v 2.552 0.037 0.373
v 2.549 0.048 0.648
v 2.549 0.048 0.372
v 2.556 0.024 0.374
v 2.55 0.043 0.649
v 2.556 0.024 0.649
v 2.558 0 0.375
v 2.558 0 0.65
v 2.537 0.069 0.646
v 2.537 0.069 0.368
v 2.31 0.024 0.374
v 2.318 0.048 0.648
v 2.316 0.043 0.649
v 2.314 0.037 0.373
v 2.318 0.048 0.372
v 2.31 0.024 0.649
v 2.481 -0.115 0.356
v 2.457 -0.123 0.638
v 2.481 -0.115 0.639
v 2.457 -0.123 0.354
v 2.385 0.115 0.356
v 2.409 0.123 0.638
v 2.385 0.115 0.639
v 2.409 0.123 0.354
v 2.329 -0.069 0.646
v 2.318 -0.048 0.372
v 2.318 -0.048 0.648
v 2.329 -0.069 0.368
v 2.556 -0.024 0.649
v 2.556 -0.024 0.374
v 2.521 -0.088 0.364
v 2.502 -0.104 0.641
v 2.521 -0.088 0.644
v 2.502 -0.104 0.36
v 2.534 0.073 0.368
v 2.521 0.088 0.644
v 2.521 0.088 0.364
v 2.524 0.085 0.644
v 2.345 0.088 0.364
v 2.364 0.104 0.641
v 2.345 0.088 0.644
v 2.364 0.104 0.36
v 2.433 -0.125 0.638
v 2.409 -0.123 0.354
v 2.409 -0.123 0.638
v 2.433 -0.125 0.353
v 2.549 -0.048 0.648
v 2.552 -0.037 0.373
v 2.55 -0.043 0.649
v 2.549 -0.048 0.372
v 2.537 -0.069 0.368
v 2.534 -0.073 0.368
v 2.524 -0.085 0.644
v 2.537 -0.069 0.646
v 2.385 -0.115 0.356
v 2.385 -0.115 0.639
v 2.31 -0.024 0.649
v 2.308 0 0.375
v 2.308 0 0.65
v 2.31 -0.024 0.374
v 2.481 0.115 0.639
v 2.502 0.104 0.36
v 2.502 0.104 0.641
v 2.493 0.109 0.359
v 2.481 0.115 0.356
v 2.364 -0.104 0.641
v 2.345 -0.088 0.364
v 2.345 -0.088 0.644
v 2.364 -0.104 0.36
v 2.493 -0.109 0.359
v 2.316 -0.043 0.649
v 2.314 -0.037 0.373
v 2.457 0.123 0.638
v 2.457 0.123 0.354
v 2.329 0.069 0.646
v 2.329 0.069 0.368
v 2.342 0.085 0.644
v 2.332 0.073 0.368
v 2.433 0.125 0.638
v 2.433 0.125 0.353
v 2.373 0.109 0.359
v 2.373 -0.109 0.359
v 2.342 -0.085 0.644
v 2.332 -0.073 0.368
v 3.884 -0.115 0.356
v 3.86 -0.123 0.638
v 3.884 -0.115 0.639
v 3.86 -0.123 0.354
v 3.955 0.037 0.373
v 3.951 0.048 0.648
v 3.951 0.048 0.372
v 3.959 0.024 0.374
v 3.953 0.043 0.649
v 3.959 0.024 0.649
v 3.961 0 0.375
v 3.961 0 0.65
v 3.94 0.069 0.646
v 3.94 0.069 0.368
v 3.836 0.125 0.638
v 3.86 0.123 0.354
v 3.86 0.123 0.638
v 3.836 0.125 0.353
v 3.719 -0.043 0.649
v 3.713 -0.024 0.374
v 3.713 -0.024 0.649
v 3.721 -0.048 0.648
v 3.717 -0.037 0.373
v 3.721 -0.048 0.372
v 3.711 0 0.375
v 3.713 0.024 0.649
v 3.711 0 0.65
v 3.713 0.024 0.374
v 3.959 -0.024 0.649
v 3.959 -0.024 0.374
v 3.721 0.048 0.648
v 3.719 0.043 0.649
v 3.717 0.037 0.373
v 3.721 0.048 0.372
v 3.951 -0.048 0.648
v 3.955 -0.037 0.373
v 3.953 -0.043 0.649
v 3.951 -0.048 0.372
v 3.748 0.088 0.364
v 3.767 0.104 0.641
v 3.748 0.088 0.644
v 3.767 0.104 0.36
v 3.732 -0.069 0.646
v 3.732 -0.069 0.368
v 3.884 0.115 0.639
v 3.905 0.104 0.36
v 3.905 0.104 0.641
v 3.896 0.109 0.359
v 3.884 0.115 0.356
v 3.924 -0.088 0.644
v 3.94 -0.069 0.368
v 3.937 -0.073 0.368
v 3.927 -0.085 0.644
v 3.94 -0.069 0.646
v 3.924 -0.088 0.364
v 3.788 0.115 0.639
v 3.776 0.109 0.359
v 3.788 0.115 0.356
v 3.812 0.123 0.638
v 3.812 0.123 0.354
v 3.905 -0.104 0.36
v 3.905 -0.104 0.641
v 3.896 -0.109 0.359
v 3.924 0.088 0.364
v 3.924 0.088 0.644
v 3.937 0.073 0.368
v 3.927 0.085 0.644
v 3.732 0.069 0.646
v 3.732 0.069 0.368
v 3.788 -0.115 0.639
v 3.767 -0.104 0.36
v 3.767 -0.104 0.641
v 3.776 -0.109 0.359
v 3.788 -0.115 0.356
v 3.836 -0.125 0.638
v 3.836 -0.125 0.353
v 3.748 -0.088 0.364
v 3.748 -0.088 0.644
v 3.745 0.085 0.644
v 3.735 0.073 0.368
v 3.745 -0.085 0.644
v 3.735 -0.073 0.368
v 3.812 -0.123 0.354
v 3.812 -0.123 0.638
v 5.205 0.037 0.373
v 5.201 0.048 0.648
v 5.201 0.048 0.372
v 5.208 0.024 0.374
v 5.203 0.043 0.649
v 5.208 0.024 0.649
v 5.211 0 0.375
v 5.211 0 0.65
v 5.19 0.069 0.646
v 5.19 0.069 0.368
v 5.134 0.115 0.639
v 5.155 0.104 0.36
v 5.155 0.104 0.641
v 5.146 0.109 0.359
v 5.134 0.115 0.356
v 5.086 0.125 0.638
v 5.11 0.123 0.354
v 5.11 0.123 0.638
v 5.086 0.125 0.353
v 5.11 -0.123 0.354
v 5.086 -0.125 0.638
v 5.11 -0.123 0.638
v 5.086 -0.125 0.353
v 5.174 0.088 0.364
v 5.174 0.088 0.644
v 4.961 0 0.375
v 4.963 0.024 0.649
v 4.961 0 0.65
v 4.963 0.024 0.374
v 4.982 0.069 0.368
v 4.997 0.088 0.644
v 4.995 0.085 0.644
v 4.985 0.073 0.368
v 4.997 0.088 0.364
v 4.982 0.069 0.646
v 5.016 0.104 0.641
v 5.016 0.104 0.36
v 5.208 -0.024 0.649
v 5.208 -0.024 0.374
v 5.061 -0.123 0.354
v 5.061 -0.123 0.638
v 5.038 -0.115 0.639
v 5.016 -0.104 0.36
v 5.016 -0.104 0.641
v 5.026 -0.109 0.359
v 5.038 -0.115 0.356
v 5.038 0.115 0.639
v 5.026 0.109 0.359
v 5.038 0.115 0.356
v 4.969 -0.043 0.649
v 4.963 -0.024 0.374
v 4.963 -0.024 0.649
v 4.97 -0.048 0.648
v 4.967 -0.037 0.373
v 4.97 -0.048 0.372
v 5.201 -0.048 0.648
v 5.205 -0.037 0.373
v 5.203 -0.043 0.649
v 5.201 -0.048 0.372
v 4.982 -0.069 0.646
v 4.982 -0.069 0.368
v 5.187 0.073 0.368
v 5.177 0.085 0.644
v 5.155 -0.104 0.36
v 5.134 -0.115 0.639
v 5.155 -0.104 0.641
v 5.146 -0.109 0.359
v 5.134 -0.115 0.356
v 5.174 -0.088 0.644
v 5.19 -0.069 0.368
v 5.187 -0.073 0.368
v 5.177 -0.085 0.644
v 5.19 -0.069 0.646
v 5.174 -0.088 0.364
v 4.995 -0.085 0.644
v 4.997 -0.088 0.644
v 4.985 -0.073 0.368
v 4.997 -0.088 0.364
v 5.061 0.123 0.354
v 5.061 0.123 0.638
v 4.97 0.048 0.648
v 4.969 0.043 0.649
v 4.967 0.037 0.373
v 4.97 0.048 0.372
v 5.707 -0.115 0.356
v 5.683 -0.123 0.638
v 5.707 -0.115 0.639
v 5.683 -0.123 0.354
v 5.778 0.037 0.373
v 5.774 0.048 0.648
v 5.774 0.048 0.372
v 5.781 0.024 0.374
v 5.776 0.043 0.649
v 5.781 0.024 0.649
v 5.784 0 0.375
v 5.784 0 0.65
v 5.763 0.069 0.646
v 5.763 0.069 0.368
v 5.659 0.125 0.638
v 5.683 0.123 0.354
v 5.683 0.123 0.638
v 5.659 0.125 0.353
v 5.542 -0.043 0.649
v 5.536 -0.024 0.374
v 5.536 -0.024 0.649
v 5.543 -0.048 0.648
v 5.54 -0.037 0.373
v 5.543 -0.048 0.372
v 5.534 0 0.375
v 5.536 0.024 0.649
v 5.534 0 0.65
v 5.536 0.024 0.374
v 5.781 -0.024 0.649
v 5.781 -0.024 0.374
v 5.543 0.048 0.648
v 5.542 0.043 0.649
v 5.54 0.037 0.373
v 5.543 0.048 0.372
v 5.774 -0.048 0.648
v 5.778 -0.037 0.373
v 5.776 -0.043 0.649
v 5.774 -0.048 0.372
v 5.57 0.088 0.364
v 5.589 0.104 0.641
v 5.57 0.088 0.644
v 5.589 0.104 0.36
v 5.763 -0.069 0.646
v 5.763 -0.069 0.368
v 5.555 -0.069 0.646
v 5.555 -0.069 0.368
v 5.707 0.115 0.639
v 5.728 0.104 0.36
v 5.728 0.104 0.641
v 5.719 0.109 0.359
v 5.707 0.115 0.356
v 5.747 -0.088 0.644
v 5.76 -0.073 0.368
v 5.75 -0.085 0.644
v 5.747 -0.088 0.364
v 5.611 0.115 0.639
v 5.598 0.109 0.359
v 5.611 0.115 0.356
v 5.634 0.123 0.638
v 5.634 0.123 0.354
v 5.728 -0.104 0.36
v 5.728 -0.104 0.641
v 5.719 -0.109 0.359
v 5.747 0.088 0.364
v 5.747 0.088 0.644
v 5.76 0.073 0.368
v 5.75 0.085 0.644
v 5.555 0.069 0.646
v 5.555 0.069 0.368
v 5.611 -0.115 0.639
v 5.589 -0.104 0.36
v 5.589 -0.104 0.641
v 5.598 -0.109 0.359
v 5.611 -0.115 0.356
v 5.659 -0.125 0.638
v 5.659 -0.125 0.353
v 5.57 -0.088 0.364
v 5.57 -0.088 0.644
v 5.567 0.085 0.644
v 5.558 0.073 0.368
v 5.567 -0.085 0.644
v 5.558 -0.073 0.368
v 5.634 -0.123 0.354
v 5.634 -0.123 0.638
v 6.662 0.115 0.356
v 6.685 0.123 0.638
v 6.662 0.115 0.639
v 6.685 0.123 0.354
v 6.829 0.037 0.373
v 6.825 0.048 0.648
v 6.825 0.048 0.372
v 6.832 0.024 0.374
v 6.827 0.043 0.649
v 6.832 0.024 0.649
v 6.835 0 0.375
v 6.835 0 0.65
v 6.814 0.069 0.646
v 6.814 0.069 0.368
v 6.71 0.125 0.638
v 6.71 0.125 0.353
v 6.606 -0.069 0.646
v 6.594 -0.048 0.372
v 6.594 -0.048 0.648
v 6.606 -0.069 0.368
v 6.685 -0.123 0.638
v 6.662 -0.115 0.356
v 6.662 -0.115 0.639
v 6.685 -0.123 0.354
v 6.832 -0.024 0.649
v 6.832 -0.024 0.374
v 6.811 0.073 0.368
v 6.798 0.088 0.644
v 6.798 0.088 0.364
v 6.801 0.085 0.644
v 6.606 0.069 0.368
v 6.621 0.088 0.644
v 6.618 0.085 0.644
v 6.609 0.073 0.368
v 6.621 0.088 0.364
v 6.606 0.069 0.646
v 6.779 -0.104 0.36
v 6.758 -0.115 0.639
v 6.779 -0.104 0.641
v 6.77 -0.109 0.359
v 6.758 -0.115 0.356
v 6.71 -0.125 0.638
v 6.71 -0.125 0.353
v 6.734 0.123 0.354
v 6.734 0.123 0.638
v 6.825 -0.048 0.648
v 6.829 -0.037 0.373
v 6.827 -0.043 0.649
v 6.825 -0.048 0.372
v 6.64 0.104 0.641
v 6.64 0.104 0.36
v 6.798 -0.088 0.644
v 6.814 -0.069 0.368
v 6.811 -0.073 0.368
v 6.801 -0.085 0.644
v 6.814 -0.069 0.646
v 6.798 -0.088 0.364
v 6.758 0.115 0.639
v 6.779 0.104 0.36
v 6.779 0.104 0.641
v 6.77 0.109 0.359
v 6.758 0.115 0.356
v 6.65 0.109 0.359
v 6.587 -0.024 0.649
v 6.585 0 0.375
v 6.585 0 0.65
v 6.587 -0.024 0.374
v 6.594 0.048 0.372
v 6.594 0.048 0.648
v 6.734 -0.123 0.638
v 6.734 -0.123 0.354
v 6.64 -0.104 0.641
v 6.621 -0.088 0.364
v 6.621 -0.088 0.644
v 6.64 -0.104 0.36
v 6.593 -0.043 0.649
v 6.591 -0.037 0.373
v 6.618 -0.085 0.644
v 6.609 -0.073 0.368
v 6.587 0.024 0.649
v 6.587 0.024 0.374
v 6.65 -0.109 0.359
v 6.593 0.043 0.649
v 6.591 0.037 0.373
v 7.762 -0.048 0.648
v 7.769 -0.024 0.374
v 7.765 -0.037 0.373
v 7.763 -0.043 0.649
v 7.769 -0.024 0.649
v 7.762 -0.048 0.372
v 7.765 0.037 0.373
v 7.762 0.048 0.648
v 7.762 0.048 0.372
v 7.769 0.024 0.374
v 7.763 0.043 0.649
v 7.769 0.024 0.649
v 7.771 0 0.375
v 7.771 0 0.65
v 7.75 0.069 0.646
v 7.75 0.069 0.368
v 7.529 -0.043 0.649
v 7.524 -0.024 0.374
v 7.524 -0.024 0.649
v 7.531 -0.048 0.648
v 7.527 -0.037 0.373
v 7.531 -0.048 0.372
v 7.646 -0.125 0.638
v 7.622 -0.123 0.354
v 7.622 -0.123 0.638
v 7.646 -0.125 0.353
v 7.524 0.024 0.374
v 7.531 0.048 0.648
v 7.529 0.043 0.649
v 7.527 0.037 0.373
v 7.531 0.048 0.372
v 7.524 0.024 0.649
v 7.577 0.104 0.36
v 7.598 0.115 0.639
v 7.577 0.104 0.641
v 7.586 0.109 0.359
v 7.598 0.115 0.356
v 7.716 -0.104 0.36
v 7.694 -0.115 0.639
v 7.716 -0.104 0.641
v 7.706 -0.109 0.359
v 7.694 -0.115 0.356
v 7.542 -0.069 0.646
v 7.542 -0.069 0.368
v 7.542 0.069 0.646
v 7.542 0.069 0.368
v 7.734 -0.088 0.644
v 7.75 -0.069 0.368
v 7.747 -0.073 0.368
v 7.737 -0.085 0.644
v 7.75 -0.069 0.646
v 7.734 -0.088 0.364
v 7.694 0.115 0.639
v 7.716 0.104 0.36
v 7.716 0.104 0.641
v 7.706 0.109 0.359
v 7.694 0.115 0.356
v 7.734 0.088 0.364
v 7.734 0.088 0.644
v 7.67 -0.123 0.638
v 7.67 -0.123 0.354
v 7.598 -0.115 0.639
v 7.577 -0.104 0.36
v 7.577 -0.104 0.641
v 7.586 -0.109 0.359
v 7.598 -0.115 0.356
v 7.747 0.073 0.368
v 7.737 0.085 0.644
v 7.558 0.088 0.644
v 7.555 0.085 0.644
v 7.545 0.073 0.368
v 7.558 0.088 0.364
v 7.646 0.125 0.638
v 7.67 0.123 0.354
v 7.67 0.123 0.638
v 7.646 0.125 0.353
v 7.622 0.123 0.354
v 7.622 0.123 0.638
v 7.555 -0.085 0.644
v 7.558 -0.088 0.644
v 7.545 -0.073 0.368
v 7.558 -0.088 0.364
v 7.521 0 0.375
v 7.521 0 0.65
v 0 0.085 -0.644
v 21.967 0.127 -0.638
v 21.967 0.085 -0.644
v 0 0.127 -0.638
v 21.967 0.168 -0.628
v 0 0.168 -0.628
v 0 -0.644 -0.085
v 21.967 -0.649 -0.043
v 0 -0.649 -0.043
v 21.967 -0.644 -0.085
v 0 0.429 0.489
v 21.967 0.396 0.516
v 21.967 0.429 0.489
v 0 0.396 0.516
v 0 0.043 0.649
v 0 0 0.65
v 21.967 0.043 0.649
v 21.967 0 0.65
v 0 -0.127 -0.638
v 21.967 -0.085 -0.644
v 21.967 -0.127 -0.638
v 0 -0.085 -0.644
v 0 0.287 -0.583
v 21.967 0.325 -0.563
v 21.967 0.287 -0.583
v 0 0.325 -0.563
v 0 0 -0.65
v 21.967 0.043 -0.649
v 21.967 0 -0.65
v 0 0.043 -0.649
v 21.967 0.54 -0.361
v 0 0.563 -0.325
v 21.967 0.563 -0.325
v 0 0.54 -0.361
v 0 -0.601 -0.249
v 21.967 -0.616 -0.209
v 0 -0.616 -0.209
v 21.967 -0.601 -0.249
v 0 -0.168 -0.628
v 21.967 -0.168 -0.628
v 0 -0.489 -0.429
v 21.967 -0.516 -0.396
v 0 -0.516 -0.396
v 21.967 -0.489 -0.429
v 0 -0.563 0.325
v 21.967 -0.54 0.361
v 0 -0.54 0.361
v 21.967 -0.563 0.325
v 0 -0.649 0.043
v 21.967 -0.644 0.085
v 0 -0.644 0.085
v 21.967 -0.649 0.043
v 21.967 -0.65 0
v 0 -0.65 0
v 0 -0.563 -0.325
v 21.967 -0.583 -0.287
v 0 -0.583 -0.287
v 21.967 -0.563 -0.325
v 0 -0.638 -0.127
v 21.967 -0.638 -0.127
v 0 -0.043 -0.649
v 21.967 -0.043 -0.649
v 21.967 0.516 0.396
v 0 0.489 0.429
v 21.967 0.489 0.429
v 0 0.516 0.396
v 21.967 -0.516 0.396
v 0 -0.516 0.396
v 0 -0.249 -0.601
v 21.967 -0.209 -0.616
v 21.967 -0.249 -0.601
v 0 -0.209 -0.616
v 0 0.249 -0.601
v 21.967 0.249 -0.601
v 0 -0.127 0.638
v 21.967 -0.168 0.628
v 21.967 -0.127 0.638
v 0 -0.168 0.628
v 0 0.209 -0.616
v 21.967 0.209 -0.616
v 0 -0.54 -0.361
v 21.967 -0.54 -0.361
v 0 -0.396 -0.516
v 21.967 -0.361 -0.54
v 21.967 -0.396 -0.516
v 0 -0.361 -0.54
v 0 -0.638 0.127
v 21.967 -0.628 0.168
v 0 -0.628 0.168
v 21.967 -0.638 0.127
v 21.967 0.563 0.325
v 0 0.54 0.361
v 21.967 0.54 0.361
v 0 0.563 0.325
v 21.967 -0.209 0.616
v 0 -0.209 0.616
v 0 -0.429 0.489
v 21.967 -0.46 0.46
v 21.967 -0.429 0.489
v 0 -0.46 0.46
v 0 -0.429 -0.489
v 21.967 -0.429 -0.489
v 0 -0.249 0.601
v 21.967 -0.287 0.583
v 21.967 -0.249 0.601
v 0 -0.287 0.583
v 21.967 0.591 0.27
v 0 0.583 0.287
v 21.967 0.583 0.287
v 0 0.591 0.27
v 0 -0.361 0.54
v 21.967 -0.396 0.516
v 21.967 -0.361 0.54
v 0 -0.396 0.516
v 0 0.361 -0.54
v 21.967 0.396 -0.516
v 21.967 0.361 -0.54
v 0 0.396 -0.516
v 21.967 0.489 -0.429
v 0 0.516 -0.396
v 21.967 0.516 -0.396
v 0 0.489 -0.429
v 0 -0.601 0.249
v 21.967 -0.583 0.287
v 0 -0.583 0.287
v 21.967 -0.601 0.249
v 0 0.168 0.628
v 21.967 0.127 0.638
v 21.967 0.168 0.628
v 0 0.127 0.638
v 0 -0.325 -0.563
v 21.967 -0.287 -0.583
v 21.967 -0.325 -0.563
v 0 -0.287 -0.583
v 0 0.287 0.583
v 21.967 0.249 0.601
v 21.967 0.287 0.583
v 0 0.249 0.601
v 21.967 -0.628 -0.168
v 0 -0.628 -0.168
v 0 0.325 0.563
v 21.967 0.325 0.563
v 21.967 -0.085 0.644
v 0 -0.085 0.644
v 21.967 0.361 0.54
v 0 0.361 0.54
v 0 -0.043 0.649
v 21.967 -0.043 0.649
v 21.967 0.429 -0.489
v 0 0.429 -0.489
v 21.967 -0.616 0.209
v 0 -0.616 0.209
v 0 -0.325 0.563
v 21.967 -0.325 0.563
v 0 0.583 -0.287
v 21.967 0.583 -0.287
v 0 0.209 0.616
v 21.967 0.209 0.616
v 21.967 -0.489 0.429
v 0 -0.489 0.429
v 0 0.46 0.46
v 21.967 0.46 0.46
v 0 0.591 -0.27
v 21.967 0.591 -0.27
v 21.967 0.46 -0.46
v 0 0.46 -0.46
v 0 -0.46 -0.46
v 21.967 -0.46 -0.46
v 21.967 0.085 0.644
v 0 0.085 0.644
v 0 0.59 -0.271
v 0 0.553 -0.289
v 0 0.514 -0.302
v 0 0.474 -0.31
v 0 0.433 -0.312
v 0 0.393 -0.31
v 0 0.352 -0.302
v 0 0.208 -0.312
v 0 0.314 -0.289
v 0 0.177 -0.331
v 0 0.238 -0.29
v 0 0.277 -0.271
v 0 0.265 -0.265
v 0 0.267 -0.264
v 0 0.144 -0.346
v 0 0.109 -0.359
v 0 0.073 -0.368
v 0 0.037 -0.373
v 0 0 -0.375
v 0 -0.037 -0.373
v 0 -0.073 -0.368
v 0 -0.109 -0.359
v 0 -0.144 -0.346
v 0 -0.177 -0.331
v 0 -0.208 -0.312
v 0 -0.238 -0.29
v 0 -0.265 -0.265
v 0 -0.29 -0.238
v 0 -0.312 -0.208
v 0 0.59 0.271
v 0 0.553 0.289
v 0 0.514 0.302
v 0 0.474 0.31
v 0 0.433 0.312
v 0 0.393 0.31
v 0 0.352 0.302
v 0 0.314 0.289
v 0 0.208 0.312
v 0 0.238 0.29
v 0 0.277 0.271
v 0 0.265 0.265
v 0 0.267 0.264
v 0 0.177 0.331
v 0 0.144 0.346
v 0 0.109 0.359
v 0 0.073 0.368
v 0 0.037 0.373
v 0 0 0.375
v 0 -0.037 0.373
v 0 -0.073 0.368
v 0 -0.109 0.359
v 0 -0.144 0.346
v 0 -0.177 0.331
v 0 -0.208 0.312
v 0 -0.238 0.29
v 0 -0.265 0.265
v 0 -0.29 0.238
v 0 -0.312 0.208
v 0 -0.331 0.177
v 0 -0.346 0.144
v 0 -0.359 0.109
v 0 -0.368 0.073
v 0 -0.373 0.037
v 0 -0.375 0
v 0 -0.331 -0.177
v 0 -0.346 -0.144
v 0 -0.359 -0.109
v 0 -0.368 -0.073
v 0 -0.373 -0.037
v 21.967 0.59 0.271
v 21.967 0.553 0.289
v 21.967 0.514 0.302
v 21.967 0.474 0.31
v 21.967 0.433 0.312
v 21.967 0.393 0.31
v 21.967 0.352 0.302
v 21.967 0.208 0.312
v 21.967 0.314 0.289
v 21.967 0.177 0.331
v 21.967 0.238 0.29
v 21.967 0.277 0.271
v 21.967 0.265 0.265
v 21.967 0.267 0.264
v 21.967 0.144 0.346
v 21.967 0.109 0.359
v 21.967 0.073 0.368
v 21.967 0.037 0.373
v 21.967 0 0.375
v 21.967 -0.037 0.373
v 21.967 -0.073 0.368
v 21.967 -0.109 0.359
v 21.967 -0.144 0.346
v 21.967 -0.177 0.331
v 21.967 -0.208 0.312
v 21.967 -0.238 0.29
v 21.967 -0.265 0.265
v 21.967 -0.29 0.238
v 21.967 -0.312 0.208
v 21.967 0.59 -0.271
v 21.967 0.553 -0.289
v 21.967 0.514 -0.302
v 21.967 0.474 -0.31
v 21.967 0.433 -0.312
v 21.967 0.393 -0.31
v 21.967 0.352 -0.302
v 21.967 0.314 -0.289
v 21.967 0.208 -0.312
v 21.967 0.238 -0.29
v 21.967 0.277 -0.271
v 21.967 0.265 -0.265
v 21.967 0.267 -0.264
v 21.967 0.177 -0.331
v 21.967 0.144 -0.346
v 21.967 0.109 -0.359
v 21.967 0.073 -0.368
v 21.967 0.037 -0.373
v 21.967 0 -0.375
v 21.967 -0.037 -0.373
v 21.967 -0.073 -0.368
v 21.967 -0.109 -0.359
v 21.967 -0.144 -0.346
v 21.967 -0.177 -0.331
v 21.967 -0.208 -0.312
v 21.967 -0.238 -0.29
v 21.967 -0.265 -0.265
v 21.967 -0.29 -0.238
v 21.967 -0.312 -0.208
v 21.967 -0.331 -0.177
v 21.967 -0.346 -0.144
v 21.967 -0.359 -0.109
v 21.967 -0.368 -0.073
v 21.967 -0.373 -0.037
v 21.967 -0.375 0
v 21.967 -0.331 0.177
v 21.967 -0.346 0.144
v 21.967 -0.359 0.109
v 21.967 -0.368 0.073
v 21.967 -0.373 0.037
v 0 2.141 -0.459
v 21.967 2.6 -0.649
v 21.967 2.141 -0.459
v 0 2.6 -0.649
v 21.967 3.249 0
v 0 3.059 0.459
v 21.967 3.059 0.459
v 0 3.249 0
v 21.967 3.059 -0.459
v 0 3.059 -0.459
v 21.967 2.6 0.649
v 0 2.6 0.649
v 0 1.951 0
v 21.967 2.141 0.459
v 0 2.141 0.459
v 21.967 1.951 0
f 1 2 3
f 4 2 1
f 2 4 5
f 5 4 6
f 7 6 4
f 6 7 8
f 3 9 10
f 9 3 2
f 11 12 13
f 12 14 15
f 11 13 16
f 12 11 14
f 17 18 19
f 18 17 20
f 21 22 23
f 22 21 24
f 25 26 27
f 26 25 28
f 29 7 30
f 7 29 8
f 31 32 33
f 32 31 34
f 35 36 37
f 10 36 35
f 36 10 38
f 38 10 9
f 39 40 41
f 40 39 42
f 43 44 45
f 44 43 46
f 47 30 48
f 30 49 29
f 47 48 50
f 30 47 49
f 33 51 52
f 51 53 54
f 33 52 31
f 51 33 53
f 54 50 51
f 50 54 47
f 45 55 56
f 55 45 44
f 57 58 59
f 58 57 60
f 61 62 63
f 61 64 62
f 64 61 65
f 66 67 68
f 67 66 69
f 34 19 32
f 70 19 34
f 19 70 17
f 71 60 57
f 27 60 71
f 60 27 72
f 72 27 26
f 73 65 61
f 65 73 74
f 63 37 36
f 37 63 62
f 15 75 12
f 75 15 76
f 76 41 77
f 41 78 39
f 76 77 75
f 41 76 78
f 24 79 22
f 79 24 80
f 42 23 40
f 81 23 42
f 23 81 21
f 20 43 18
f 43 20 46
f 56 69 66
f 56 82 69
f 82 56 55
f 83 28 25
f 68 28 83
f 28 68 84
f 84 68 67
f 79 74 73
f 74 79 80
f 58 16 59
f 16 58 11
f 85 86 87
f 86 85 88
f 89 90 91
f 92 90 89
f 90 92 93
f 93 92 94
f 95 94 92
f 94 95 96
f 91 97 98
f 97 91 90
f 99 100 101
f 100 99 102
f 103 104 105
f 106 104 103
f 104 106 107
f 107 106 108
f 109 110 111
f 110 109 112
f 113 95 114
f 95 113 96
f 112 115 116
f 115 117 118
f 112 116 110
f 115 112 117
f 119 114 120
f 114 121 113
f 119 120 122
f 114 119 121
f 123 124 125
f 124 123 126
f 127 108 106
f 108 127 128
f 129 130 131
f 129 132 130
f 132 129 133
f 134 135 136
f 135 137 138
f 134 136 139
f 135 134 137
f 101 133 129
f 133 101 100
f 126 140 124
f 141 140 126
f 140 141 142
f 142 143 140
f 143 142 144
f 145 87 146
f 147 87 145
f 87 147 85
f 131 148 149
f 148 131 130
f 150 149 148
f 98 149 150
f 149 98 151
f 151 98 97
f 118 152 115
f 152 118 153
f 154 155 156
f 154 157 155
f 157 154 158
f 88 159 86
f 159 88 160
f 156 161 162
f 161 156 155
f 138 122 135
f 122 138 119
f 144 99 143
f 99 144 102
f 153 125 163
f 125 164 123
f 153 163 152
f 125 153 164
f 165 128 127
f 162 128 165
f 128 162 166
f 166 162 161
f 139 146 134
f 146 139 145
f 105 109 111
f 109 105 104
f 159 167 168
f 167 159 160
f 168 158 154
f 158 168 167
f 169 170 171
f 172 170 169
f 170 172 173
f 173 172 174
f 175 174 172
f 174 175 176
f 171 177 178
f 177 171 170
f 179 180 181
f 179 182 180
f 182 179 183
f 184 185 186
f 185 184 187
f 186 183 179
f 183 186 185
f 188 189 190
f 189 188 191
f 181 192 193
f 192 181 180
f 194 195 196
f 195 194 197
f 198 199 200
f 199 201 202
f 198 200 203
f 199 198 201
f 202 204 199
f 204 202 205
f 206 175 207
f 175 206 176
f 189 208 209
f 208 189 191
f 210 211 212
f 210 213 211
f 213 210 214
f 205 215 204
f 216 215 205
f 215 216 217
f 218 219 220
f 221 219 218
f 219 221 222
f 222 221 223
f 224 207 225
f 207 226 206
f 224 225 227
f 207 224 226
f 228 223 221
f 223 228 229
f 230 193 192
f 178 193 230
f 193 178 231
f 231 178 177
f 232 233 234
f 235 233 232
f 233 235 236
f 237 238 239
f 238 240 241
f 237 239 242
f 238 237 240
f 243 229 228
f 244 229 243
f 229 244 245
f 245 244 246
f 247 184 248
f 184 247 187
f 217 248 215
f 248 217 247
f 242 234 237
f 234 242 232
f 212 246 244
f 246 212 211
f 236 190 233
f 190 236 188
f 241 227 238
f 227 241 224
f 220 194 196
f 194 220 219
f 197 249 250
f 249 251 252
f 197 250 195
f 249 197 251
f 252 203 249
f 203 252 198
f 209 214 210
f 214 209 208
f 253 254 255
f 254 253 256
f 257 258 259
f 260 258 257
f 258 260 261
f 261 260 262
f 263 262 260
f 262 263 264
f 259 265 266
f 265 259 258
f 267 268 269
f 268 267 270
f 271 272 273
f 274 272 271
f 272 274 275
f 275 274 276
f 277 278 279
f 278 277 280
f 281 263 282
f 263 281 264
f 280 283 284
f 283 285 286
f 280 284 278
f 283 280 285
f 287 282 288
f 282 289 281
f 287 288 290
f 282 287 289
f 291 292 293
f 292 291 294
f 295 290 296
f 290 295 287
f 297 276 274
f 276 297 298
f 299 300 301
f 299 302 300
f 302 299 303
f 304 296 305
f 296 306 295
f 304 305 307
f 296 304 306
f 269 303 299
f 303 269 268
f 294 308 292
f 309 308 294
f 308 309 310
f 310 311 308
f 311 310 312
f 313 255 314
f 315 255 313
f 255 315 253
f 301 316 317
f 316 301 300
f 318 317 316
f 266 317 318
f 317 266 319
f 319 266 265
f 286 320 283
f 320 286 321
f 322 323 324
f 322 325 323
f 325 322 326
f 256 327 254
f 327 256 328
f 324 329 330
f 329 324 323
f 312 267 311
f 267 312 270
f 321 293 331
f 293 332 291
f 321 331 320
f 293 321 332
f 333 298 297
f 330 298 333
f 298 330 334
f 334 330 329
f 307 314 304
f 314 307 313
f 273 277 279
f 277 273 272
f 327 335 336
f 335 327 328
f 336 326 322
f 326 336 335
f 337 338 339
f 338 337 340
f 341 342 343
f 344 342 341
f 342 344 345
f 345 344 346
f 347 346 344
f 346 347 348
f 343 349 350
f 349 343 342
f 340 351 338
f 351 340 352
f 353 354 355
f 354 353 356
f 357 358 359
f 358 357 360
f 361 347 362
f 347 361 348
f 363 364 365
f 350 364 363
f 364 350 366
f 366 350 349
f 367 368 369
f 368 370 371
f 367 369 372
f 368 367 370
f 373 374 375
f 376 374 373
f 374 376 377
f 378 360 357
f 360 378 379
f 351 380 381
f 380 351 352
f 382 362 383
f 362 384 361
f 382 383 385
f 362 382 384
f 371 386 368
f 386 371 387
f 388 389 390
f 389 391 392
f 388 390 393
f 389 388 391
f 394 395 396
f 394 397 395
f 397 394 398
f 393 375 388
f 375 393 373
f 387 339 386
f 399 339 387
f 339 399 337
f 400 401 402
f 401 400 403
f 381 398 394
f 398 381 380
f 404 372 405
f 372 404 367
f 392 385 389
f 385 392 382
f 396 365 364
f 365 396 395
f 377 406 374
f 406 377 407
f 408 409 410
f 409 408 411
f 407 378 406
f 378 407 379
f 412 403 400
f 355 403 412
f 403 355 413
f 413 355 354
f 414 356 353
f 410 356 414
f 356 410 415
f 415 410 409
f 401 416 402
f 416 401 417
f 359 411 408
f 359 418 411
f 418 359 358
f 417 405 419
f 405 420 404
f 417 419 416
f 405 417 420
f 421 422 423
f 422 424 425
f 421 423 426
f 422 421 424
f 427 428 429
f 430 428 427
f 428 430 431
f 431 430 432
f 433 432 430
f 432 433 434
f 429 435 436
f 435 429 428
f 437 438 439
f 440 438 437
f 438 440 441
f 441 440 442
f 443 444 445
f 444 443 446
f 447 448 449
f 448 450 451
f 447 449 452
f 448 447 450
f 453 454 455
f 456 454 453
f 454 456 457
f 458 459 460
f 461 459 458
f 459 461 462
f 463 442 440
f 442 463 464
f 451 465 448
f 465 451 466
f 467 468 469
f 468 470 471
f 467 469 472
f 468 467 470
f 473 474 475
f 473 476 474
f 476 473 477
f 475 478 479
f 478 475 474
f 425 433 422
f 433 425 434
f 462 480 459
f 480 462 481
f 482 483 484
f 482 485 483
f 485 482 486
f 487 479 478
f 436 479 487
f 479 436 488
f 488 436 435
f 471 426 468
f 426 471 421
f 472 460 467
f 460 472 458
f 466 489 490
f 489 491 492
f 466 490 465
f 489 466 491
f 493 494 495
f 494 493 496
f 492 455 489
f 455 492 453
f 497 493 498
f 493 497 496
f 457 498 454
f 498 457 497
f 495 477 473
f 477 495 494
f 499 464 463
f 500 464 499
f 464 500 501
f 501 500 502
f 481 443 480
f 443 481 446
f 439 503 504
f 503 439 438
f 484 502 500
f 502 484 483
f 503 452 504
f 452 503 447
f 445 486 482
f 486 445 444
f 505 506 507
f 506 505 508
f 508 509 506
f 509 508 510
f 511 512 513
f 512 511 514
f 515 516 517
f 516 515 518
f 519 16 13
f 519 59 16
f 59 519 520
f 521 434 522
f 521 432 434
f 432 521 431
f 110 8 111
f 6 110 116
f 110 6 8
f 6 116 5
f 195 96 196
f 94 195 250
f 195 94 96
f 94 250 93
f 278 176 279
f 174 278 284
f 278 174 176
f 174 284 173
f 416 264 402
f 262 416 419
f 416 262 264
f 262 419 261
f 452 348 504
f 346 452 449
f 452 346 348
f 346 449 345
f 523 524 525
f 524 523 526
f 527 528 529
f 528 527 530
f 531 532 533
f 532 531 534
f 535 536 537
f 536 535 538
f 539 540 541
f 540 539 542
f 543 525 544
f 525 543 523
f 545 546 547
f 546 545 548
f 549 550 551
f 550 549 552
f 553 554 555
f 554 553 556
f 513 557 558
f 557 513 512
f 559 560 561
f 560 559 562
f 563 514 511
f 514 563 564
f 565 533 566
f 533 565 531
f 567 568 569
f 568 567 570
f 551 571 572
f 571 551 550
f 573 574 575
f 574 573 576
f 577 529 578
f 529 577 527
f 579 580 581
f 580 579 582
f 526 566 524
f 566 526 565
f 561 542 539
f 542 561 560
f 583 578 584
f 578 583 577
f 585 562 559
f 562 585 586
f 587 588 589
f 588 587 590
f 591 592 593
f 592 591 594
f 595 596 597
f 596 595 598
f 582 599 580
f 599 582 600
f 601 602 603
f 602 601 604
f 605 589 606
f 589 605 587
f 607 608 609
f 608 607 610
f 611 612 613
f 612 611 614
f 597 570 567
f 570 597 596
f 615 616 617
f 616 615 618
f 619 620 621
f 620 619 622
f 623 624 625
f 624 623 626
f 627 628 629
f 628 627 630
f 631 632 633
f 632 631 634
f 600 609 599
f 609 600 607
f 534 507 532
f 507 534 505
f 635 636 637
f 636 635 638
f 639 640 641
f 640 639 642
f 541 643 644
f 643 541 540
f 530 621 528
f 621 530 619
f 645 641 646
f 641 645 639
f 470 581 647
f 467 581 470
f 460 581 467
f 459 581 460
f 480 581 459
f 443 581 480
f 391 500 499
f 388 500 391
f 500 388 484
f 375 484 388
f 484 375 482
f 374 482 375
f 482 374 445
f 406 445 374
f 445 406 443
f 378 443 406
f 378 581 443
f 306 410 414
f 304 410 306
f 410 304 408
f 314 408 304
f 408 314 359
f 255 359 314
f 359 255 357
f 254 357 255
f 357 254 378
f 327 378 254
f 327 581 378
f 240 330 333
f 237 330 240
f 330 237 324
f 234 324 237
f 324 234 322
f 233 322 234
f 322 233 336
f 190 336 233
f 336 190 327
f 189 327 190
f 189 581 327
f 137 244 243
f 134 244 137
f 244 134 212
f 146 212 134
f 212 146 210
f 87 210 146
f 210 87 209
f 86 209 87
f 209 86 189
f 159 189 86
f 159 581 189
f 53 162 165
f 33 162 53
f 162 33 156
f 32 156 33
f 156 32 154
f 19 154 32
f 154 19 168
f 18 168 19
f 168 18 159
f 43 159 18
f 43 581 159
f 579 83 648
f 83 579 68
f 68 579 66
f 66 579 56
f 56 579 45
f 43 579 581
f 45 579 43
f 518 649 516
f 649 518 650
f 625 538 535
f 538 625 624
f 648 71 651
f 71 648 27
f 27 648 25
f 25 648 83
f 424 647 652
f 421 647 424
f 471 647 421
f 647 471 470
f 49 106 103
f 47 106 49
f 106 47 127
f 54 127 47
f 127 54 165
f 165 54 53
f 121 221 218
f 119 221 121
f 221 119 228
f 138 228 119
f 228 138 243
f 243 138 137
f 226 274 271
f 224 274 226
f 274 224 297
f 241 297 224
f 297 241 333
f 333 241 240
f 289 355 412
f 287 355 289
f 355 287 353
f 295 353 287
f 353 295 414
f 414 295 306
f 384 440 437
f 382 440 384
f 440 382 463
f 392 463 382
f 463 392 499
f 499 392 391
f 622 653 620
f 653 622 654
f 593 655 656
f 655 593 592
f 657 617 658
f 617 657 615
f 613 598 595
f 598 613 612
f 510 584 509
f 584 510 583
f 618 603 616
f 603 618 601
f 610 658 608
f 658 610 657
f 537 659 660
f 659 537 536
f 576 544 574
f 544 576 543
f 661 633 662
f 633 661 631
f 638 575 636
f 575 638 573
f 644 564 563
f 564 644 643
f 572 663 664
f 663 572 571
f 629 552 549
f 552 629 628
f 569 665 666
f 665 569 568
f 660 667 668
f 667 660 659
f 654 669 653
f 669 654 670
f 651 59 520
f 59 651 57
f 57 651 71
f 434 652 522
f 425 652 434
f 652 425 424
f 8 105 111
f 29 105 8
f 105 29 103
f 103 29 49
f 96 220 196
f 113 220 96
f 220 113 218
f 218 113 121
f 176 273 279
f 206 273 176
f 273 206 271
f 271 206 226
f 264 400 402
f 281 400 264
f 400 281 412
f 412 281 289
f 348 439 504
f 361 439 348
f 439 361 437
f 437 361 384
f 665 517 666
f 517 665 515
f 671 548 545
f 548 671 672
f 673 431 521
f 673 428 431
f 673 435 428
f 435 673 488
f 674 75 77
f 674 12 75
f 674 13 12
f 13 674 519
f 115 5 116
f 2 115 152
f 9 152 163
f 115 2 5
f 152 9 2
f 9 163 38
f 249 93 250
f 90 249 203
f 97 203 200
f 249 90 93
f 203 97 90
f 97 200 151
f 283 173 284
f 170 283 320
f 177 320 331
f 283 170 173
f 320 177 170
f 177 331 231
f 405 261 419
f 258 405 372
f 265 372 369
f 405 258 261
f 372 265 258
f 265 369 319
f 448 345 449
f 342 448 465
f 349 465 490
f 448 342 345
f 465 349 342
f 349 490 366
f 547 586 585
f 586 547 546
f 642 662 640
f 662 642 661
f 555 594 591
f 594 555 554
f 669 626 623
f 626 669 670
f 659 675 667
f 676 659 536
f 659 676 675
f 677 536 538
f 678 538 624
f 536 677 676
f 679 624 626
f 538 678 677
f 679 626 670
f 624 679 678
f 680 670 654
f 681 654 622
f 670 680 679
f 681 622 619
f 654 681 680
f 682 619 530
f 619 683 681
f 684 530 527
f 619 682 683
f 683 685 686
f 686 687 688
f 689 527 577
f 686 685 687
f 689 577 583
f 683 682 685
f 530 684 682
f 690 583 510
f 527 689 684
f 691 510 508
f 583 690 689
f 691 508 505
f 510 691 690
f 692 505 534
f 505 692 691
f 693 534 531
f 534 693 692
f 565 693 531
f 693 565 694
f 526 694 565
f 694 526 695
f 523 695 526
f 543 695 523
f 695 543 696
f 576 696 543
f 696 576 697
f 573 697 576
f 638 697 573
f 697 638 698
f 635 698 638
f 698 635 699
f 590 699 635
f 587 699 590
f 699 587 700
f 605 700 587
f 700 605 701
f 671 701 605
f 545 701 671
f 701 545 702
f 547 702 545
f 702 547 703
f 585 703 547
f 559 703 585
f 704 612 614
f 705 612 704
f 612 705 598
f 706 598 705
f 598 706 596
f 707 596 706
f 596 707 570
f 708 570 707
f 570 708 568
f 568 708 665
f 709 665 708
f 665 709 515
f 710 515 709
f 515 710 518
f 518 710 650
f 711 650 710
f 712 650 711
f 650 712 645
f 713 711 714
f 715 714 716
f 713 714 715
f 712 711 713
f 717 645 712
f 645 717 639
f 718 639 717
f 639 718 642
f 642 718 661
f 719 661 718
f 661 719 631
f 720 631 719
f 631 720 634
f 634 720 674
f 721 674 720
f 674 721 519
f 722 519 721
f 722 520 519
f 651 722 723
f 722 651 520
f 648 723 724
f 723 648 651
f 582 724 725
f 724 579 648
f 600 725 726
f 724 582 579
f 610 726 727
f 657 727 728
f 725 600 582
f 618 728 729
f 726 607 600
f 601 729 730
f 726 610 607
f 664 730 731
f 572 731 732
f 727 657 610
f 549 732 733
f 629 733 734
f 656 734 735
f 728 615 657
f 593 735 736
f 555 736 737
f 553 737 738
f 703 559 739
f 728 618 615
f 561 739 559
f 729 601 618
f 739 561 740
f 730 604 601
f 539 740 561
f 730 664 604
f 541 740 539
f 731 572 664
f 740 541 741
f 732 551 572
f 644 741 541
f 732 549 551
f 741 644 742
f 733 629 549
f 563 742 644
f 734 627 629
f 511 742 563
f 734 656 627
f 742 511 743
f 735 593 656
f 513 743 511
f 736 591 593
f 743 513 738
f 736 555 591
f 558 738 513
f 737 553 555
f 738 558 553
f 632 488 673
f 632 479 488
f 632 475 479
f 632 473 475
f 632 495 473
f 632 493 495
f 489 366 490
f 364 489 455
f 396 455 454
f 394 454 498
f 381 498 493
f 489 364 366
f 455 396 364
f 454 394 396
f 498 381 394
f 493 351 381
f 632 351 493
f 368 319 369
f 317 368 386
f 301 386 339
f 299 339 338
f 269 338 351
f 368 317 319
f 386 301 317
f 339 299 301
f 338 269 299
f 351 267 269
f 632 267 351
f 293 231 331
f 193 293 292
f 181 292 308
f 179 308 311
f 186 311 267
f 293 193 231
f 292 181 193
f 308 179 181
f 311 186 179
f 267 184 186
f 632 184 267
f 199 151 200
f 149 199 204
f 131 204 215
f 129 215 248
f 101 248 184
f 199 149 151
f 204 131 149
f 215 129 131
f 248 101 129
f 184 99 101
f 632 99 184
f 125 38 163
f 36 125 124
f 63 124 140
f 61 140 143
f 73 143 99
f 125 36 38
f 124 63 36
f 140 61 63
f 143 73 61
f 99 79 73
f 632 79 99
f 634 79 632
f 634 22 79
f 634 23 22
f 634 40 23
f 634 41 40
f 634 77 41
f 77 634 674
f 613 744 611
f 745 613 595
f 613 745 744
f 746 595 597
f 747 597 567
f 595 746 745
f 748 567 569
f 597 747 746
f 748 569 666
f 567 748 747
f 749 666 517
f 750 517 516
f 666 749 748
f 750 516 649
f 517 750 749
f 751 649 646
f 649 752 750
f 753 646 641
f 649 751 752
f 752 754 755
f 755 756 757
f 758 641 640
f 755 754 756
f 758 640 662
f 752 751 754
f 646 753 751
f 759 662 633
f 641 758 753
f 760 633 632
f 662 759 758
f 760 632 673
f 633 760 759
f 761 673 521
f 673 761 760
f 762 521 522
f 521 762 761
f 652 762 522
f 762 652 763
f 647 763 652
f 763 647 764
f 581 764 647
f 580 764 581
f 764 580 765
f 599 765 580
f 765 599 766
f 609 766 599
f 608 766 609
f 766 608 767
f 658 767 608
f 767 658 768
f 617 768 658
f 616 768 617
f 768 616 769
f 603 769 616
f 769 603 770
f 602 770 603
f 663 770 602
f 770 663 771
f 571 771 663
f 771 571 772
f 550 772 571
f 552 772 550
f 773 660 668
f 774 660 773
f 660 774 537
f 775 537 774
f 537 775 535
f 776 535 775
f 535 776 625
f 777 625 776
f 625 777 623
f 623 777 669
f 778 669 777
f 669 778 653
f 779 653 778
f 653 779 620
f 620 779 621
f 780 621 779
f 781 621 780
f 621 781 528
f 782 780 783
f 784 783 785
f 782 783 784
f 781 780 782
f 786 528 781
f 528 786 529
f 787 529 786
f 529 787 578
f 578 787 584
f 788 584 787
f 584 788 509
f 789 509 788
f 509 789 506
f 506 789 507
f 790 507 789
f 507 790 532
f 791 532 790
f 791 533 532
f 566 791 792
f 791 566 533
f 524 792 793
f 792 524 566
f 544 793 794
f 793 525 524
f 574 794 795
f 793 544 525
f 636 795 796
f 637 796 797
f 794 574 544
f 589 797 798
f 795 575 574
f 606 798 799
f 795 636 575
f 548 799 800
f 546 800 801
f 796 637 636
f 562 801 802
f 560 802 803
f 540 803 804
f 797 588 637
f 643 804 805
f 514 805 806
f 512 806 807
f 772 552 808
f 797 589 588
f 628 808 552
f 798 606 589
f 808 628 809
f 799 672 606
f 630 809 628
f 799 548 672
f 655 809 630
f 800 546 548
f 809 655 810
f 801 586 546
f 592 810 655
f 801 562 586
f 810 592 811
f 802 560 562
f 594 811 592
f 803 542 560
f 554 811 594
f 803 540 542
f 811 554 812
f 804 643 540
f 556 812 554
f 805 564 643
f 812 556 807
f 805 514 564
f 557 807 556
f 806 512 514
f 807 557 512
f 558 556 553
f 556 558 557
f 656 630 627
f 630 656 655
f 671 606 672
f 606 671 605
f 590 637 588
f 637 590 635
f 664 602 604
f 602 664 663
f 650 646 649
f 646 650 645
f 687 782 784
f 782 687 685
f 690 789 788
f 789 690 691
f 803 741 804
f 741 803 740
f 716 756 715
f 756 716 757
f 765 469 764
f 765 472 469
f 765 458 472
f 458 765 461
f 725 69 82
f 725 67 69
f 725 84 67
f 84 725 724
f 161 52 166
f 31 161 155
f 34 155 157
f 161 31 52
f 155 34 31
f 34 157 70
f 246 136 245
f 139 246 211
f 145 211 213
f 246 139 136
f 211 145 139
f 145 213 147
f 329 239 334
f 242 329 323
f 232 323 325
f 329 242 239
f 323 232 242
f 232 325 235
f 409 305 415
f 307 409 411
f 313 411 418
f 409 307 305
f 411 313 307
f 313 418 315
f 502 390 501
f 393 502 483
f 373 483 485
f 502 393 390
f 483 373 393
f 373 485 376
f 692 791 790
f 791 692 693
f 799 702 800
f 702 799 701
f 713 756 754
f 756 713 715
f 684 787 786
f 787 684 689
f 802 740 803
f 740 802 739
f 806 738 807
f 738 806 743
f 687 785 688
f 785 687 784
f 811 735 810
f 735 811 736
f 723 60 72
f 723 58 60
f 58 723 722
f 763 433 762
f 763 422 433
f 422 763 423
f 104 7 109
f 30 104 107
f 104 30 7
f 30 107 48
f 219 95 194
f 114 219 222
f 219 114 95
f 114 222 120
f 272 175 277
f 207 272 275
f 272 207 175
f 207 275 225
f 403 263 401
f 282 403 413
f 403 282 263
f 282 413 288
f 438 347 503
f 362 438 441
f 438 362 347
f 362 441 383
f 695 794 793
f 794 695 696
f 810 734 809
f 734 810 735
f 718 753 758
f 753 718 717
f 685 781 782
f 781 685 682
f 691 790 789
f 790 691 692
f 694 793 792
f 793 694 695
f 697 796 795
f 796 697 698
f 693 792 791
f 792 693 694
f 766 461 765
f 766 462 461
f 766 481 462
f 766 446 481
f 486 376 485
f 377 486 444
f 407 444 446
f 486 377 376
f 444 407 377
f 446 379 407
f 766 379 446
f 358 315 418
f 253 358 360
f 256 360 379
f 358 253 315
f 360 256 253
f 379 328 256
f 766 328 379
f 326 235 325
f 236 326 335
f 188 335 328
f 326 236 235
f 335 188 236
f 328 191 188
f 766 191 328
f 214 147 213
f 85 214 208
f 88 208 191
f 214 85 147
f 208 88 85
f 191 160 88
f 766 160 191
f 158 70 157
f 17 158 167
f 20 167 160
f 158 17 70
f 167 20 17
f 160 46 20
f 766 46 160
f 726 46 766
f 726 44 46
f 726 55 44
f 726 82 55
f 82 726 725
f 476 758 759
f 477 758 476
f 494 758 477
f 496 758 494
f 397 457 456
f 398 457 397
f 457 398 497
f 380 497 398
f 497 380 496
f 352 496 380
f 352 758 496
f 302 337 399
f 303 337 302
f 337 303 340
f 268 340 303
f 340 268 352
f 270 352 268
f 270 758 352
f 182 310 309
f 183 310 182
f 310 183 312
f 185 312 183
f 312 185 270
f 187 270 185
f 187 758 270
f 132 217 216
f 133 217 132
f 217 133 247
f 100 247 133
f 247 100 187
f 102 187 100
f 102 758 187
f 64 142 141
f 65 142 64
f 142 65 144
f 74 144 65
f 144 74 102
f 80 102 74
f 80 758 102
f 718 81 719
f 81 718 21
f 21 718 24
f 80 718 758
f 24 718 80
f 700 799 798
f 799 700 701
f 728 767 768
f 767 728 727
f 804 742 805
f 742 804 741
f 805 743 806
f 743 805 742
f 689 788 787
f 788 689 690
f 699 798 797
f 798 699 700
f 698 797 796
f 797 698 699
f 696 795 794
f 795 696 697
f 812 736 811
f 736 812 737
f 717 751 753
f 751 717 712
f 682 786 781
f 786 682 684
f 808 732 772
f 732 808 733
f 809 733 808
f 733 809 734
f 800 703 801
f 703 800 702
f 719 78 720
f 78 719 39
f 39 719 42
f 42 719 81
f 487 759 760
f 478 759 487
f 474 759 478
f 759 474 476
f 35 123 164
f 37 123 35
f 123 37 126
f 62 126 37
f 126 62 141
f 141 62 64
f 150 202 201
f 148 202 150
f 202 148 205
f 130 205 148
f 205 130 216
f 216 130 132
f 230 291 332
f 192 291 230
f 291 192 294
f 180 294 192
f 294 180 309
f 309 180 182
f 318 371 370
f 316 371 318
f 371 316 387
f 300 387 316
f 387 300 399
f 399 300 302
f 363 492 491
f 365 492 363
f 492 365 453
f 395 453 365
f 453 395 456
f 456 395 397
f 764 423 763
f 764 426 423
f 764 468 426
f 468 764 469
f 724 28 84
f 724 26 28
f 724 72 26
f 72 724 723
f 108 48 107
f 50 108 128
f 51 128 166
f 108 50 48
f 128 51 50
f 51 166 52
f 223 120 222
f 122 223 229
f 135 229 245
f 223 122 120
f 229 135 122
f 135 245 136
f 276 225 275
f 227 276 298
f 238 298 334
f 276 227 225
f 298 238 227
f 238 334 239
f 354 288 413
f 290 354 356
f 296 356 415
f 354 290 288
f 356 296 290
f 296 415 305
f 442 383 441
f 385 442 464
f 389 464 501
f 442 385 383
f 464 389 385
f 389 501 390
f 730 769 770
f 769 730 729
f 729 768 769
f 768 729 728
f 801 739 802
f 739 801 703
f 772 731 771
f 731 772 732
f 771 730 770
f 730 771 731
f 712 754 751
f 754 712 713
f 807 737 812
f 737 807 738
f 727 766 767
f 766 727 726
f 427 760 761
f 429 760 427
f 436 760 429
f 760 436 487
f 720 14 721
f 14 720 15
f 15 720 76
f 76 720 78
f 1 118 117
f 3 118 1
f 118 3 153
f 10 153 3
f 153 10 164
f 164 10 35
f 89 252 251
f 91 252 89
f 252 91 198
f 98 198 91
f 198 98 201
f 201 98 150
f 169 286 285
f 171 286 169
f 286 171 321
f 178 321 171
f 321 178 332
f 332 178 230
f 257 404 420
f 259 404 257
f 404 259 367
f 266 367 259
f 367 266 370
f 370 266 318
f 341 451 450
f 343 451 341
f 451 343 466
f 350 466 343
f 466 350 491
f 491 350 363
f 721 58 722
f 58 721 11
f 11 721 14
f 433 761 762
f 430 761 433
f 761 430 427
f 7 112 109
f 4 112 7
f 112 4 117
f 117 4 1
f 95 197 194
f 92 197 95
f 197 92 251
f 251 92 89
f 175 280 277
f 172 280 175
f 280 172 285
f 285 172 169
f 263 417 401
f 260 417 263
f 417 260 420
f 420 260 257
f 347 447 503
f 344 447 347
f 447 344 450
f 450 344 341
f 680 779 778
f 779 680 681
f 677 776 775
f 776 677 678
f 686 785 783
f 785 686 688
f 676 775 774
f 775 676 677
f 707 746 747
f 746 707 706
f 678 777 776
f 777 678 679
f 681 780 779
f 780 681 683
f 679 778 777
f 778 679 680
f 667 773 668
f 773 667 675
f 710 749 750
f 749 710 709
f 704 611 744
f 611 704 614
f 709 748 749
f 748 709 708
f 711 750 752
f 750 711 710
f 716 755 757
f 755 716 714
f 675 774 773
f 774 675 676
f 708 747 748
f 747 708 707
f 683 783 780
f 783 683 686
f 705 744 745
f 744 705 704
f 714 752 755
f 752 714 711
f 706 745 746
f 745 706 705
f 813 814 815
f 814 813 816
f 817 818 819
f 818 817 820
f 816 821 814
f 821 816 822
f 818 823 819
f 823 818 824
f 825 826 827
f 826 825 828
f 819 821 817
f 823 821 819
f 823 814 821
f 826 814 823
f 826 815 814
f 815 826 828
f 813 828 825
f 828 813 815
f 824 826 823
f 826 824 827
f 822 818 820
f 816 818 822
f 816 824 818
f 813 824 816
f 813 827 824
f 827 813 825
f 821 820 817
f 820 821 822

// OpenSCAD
// Drone Flute family — bore + tone-hole-schedule envelope master (DXF-first family).
//
// Authority: pending_measurement. NOT fabrication authority until reviewed
// (see visual-output-register.csv CAD-001 and cad/mcp-session-log.md).
// dxf-shop-authority.md still lists body/bore/tone-hole/drone-block DXF/CAD
// as "missing" — this .scad is the first parametric envelope, not a
// replacement for that reviewed export chain (DXF-REV-001, FAB-BORE-009
// remain blocked until a reviewed CAD/DXF revision is released).
//
// SCOPE / OUT OF SCOPE (Woodwind addendum, 2026-07-01):
//   In scope  — melody bore + drone-bore envelope diameters and lengths,
//               octagonal body facet envelope, and the six tone-hole
//               positions along the melody bore (equation-driven, like
//               fret slots).
//   Out of scope — duct/fipple geometry: SAC chamber, splitting-edge
//               (window) profile, bird-block/flue-gap voicing, undercutting
//               of tone holes, drone-socket tenon fit. These are exactly
//               the "hand-refined, tuning-sensitive" regions that must stay
//               hand-refined and are NOT modeled here. See dxf-shop-authority.md.
//
// Dimension sources (do not edit values without updating the source record):
//   - member_id / target_hz / bore_id_in / total_length_in / body_od_in /
//     facet_side_in / drone_bore_in: family-spec.csv (one row per member;
//     dimension_provenance = measurement_required for every row).
//   - governing acoustic model (open-open pipe + K2 bore correction) and
//     hole-position formula: design.md "Governing model" section, mirrored
//     in drone-flutes-starter.wl (source-only, not executed here).
//     f = c / (2*L_eff); L_eff = (c/(2*f0)) * (1 + K2(bore_id));
//     pos_from_foot = L_eff * (1 - f0/f_hole); pentatonic minor semitone
//     offsets [+3,+5,+7,+8,+10,+12] from the fundamental.
//   - facet geometry constants (facet_allowance, n_facets, wall thickness):
//     drone-flutes-starter.wl "Faceting" section, itself a mirror of
//     Drone-Flutes-Design.xlsx Master_Inputs — NOT independently re-derived
//     here, carried through as pending_measurement.
//   - tone-hole diameter per member: bom.csv row 3.5 ("Brad-point drills,
//     4 each, 1/4, 9/32, 5/16, 11/32 ... Tone holes"). ASSUMPTION: the four
//     bit sizes are read in ascending-bore order (Am->F#m->Em->Dm) since
//     bom.csv does not tag each size to a member; flag for review.
//   - melody-bore-to-drone-bore centerline offset: NOT present in
//     family-spec.csv, design.md, or the workbook mirror. TBD — exposed as
//     a top-level parameter (bore_offset_in) so it can be corrected in one
//     place once a reviewed value exists. Do NOT treat the placeholder as
//     fabrication authority.
//
// Units: inches.

/* [Family member] */
// 0=Am, 1=F#m, 2=Em, 3=Dm (family-spec.csv row order)
member = 0;

member_ids   = ["DRN-Am", "DRN-Fsm", "DRN-Em", "DRN-Dm"];
target_hz    = [440.000, 369.994, 329.628, 293.665];          // family-spec.csv target_hz
bore_id_in   = [0.750,   0.875,   1.000,   1.125];             // family-spec.csv bore_id_in
total_len_in = [21.967,  24.987,  27.225,  29.824];             // family-spec.csv total_length_in
body_od_in   = [1.300,   1.425,   1.550,   1.675];              // family-spec.csv body_od_in (round, pre-facet)
facet_side_in= [0.497,   0.549,   0.601,   0.652];              // family-spec.csv facet_side_in
drone_bore_in= [0.625,   0.750,   0.875,   1.000];              // family-spec.csv drone_bore_in

// bom.csv row 3.5 brad-point set, ascending-bore-order ASSUMPTION (ping for review).
tone_hole_dia_in = [0.250, 0.28125, 0.3125, 0.34375];

f0_hz          = target_hz[member];
bore_dia_in    = bore_id_in[member];
total_length_in= total_len_in[member];
body_dia_in    = body_od_in[member];
facet_side_len = facet_side_in[member];
drone_dia_in   = drone_bore_in[member];
hole_dia_in    = tone_hole_dia_in[member];

/* [Acoustic constants — design.md governing model] */
c_speed_of_sound_in_s = 13552; // in/s at 68 F, design.md
k_end                 = 0.6;   // open-end correction multiplier, design.md

/* [Faceting — drone-flutes-starter.wl mirror of workbook Master_Inputs] */
n_facets        = 8;     // octagon; workbook n_facets default
facet_allowance = 0.05;  // wl "Faceting" section
wall_in         = 0.25;  // wl per-member wall (same for all 4 members currently)

/* [Bore-to-bore offset — TBD, not in family-spec.csv or design.md] */
// ASSUMPTION placeholder only; do not fabricate from this value.
bore_offset_in = body_dia_in / 3;

/* [Pentatonic minor hole schedule — design.md] */
pentatonic_minor_semitones = [3, 5, 7, 8, 10, 12];

// ---------------------------------------------------------------------------
// Derived acoustic geometry (formulas, not baked values)
// ---------------------------------------------------------------------------

function k2_correction(bore_in) =
    bore_in <  0.750 ? -0.020 :
    bore_in <  0.875 ? -0.007 :
    bore_in <  1.000 ?  0.004 :
    bore_in <  1.125 ?  0.007 :
                         0.013;

function acoustic_length_in(f0, bore_in) =
    (c_speed_of_sound_in_s / (2 * f0)) * (1 + k2_correction(bore_in));

function hole_freq_hz(f0, semitone) = f0 * pow(2, semitone / 12);

function hole_pos_from_foot_in(f0, bore_in, semitone) =
    acoustic_length_in(f0, bore_in) * (1 - f0 / hole_freq_hz(f0, semitone));

// Regular-octagon circumradius from edge (facet) length.
function facet_circumradius_in(side_len) = side_len / (2 * sin(180 / n_facets));

// ---------------------------------------------------------------------------
// Modules
// ---------------------------------------------------------------------------

module melody_bore() {
  // Envelope only — no window/SAC/splitting-edge cut modeled (out of scope).
  rotate([0, 90, 0])
    cylinder(h = total_length_in, d = bore_dia_in, $fn = 64);
}

module drone_bore() {
  // Parallel envelope; length approximated at the shared body length since
  // the drone-block cavity length is a duct/voicing detail (out of scope).
  translate([0, bore_offset_in, 0])
    rotate([0, 90, 0])
      cylinder(h = total_length_in, d = drone_dia_in, $fn = 48);
}

module body_envelope_round() {
  // Pre-facet turned envelope, body_od_in from family-spec.csv.
  rotate([0, 90, 0])
    cylinder(h = total_length_in, d = body_dia_in, $fn = 96);
}

module body_envelope_facet() {
  // Reference-only octagon derived from facet_side_in; exact facet index/
  // rotation datum is a shop-jig concern (dxf-shop-authority.md
  // fixture-vblock-indexing.dxf), not modeled here.
  r = facet_circumradius_in(facet_side_len);
  rotate([0, 90, 0])
    cylinder(h = total_length_in, r = r, $fn = n_facets);
}

module tone_holes() {
  // Six pentatonic-minor holes, equation-driven positions from the foot
  // (x=0 = foot / open end). Radial placement on top of the bore only —
  // undercut/counterbore is out of scope (dxf-shop-authority.md).
  for (semitone = pentatonic_minor_semitones) {
    pos = hole_pos_from_foot_in(f0_hz, bore_dia_in, semitone);
    translate([pos, 0, bore_dia_in / 2])
      cylinder(h = wall_in * 3, d = hole_dia_in, center = true, $fn = 32);
  }
}

module drone_flute_assembly() {
  difference() {
    body_envelope_round();
    melody_bore();
    drone_bore();
    tone_holes();
  }
  // Faceted reference envelope shown as a translucent guide, offset above
  // the round body for comparison (not a cut/union — reference only).
  translate([0, 2 * body_dia_in, 0])
    body_envelope_facet();
}

drone_flute_assembly();

// Echo the hole schedule so `openscad` doubles as a position/frequency check.
echo(str("member=", member_ids[member], " f0_hz=", f0_hz,
         " L_acoustic_in=", acoustic_length_in(f0_hz, bore_dia_in)));
for (semitone = pentatonic_minor_semitones)
  echo(str("hole_semitone_", semitone,
           "_freq_hz=", hole_freq_hz(f0_hz, semitone),
           "_pos_from_foot_in=", hole_pos_from_foot_in(f0_hz, bore_dia_in, semitone)));
